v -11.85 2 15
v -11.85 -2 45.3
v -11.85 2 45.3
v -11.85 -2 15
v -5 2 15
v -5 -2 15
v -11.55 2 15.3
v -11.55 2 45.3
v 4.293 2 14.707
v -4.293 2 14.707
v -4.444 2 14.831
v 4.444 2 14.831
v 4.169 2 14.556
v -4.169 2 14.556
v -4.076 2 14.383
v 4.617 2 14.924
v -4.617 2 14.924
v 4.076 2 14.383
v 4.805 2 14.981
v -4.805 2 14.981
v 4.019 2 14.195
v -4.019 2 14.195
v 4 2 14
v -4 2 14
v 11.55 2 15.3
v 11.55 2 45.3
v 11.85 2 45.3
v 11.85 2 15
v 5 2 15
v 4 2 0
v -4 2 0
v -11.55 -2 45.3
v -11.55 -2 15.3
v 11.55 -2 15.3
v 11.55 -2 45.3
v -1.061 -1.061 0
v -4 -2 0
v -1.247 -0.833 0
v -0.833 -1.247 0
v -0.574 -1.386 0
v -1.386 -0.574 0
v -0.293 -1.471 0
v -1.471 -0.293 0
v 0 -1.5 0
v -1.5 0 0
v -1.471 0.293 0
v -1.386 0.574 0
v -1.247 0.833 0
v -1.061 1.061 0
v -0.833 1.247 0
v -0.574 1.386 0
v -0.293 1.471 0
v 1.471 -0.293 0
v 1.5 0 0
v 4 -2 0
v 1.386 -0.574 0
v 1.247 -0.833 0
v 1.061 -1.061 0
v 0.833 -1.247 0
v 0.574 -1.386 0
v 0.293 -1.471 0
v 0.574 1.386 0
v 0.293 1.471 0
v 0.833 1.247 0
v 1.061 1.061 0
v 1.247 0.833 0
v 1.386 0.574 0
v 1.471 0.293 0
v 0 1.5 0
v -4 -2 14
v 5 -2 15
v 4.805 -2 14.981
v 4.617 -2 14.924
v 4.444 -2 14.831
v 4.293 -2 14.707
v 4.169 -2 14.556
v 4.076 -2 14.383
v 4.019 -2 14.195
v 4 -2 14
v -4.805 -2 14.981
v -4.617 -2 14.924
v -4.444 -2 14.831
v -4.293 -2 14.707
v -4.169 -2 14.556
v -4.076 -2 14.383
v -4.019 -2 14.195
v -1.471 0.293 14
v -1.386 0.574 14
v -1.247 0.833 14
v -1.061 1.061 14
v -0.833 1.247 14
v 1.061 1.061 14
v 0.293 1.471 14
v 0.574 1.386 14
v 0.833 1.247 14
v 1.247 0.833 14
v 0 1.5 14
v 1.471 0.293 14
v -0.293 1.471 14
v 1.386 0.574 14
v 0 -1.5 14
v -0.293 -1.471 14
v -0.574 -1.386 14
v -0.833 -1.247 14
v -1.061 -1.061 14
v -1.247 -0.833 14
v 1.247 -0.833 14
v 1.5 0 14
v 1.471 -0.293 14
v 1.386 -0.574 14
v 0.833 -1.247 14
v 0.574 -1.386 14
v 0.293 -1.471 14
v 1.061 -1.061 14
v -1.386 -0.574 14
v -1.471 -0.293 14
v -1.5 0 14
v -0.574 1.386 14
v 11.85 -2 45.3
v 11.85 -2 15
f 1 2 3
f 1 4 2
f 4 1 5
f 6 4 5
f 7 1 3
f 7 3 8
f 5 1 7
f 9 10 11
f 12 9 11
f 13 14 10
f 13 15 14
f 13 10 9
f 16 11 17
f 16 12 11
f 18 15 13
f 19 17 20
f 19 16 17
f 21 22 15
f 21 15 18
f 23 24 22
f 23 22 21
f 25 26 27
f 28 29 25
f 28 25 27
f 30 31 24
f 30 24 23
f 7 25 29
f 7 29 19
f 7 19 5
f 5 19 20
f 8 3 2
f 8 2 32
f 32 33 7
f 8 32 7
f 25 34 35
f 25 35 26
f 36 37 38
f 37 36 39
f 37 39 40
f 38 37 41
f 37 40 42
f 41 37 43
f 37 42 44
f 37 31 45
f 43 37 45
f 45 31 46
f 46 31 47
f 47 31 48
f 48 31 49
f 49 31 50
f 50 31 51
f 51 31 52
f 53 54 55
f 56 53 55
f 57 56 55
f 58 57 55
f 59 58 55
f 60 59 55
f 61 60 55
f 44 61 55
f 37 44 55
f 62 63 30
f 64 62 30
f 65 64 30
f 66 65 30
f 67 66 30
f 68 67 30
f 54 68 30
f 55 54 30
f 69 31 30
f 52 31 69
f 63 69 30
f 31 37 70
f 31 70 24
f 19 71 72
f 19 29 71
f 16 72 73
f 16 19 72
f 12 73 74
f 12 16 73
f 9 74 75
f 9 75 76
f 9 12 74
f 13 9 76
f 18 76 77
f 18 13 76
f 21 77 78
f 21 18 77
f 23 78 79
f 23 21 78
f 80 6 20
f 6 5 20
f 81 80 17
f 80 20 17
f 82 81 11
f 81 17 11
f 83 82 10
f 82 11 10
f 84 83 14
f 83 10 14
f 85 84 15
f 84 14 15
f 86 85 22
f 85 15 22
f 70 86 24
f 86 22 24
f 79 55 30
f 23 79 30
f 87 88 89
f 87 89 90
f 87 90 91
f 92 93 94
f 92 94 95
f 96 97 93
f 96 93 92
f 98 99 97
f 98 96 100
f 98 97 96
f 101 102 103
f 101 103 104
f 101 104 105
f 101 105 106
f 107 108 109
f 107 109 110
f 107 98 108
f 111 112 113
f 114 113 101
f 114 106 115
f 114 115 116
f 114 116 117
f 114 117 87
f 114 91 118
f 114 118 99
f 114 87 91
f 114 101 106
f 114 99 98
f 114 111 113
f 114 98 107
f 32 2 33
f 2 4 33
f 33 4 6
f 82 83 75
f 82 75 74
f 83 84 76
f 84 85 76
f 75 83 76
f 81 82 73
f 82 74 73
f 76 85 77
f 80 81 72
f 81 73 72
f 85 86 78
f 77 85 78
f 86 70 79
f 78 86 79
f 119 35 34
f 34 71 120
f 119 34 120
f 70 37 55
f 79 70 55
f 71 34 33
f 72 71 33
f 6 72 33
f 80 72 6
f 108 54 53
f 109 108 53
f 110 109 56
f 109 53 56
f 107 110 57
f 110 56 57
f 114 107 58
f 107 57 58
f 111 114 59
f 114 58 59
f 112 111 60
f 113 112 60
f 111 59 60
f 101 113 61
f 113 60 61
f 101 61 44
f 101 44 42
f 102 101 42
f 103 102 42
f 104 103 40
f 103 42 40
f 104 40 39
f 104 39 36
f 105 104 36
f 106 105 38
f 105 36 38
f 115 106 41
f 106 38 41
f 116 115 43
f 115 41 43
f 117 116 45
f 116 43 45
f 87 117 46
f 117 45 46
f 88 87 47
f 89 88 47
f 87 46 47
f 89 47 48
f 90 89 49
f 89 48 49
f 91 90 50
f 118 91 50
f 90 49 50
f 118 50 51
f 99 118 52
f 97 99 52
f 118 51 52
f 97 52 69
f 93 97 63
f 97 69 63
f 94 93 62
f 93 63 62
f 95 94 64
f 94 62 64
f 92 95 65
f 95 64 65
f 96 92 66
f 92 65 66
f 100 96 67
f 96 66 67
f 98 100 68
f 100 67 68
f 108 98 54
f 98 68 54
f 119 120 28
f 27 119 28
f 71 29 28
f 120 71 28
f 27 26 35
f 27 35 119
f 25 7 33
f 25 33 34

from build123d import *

# Parameters (mm, degrees)
F0_W     = 8
F0_H     = 4
F1_DEPTH = 15
F2_R     = 1.5
F3_DEPTH = 14
F4_W     = 23.7
F4_H     = 4
F5_DEPTH = 0.3
F6_R     = 1
F7_W     = 0.3
F7_H     = 4
F8_DEPTH = 30


with BuildPart() as f1:
    # F0 (on Top) → F1 (new body)
    with BuildSketch(Plane.XY):
        Rectangle(F0_W, F0_H)
    extrude(amount=F1_DEPTH)

    # F2 (on face) → F3 (cut)
    with BuildSketch(Plane(origin=(0, 0, 0), x_dir=(1, 0, 0), z_dir=(0, 0, -1))):
        Circle(F2_R)
    extrude(amount=-F3_DEPTH, mode=Mode.SUBTRACT)

    # F4 (on face) → F5 (join)
    with BuildSketch(Plane.XY.offset(15)):
        Rectangle(F4_W, F4_H)
    extrude(amount=F5_DEPTH)

    # F6
    f6_edges = [f1.edges().sort_by_distance(p)[0] for p in [
        (-4, 0, 15),
        (4, 0, 15),
    ]]
    fillet(f6_edges, radius=F6_R)

    # F7 (on face) → F8 (join)
    with BuildSketch(Plane.XY.offset(15.3)):
        with Locations((-11.7, 0)):
            Rectangle(F7_W, F7_H)
        with Locations((11.7, 0)):
            Rectangle(F7_W, F7_H)
    extrude(amount=F8_DEPTH)


solid = f1.part
